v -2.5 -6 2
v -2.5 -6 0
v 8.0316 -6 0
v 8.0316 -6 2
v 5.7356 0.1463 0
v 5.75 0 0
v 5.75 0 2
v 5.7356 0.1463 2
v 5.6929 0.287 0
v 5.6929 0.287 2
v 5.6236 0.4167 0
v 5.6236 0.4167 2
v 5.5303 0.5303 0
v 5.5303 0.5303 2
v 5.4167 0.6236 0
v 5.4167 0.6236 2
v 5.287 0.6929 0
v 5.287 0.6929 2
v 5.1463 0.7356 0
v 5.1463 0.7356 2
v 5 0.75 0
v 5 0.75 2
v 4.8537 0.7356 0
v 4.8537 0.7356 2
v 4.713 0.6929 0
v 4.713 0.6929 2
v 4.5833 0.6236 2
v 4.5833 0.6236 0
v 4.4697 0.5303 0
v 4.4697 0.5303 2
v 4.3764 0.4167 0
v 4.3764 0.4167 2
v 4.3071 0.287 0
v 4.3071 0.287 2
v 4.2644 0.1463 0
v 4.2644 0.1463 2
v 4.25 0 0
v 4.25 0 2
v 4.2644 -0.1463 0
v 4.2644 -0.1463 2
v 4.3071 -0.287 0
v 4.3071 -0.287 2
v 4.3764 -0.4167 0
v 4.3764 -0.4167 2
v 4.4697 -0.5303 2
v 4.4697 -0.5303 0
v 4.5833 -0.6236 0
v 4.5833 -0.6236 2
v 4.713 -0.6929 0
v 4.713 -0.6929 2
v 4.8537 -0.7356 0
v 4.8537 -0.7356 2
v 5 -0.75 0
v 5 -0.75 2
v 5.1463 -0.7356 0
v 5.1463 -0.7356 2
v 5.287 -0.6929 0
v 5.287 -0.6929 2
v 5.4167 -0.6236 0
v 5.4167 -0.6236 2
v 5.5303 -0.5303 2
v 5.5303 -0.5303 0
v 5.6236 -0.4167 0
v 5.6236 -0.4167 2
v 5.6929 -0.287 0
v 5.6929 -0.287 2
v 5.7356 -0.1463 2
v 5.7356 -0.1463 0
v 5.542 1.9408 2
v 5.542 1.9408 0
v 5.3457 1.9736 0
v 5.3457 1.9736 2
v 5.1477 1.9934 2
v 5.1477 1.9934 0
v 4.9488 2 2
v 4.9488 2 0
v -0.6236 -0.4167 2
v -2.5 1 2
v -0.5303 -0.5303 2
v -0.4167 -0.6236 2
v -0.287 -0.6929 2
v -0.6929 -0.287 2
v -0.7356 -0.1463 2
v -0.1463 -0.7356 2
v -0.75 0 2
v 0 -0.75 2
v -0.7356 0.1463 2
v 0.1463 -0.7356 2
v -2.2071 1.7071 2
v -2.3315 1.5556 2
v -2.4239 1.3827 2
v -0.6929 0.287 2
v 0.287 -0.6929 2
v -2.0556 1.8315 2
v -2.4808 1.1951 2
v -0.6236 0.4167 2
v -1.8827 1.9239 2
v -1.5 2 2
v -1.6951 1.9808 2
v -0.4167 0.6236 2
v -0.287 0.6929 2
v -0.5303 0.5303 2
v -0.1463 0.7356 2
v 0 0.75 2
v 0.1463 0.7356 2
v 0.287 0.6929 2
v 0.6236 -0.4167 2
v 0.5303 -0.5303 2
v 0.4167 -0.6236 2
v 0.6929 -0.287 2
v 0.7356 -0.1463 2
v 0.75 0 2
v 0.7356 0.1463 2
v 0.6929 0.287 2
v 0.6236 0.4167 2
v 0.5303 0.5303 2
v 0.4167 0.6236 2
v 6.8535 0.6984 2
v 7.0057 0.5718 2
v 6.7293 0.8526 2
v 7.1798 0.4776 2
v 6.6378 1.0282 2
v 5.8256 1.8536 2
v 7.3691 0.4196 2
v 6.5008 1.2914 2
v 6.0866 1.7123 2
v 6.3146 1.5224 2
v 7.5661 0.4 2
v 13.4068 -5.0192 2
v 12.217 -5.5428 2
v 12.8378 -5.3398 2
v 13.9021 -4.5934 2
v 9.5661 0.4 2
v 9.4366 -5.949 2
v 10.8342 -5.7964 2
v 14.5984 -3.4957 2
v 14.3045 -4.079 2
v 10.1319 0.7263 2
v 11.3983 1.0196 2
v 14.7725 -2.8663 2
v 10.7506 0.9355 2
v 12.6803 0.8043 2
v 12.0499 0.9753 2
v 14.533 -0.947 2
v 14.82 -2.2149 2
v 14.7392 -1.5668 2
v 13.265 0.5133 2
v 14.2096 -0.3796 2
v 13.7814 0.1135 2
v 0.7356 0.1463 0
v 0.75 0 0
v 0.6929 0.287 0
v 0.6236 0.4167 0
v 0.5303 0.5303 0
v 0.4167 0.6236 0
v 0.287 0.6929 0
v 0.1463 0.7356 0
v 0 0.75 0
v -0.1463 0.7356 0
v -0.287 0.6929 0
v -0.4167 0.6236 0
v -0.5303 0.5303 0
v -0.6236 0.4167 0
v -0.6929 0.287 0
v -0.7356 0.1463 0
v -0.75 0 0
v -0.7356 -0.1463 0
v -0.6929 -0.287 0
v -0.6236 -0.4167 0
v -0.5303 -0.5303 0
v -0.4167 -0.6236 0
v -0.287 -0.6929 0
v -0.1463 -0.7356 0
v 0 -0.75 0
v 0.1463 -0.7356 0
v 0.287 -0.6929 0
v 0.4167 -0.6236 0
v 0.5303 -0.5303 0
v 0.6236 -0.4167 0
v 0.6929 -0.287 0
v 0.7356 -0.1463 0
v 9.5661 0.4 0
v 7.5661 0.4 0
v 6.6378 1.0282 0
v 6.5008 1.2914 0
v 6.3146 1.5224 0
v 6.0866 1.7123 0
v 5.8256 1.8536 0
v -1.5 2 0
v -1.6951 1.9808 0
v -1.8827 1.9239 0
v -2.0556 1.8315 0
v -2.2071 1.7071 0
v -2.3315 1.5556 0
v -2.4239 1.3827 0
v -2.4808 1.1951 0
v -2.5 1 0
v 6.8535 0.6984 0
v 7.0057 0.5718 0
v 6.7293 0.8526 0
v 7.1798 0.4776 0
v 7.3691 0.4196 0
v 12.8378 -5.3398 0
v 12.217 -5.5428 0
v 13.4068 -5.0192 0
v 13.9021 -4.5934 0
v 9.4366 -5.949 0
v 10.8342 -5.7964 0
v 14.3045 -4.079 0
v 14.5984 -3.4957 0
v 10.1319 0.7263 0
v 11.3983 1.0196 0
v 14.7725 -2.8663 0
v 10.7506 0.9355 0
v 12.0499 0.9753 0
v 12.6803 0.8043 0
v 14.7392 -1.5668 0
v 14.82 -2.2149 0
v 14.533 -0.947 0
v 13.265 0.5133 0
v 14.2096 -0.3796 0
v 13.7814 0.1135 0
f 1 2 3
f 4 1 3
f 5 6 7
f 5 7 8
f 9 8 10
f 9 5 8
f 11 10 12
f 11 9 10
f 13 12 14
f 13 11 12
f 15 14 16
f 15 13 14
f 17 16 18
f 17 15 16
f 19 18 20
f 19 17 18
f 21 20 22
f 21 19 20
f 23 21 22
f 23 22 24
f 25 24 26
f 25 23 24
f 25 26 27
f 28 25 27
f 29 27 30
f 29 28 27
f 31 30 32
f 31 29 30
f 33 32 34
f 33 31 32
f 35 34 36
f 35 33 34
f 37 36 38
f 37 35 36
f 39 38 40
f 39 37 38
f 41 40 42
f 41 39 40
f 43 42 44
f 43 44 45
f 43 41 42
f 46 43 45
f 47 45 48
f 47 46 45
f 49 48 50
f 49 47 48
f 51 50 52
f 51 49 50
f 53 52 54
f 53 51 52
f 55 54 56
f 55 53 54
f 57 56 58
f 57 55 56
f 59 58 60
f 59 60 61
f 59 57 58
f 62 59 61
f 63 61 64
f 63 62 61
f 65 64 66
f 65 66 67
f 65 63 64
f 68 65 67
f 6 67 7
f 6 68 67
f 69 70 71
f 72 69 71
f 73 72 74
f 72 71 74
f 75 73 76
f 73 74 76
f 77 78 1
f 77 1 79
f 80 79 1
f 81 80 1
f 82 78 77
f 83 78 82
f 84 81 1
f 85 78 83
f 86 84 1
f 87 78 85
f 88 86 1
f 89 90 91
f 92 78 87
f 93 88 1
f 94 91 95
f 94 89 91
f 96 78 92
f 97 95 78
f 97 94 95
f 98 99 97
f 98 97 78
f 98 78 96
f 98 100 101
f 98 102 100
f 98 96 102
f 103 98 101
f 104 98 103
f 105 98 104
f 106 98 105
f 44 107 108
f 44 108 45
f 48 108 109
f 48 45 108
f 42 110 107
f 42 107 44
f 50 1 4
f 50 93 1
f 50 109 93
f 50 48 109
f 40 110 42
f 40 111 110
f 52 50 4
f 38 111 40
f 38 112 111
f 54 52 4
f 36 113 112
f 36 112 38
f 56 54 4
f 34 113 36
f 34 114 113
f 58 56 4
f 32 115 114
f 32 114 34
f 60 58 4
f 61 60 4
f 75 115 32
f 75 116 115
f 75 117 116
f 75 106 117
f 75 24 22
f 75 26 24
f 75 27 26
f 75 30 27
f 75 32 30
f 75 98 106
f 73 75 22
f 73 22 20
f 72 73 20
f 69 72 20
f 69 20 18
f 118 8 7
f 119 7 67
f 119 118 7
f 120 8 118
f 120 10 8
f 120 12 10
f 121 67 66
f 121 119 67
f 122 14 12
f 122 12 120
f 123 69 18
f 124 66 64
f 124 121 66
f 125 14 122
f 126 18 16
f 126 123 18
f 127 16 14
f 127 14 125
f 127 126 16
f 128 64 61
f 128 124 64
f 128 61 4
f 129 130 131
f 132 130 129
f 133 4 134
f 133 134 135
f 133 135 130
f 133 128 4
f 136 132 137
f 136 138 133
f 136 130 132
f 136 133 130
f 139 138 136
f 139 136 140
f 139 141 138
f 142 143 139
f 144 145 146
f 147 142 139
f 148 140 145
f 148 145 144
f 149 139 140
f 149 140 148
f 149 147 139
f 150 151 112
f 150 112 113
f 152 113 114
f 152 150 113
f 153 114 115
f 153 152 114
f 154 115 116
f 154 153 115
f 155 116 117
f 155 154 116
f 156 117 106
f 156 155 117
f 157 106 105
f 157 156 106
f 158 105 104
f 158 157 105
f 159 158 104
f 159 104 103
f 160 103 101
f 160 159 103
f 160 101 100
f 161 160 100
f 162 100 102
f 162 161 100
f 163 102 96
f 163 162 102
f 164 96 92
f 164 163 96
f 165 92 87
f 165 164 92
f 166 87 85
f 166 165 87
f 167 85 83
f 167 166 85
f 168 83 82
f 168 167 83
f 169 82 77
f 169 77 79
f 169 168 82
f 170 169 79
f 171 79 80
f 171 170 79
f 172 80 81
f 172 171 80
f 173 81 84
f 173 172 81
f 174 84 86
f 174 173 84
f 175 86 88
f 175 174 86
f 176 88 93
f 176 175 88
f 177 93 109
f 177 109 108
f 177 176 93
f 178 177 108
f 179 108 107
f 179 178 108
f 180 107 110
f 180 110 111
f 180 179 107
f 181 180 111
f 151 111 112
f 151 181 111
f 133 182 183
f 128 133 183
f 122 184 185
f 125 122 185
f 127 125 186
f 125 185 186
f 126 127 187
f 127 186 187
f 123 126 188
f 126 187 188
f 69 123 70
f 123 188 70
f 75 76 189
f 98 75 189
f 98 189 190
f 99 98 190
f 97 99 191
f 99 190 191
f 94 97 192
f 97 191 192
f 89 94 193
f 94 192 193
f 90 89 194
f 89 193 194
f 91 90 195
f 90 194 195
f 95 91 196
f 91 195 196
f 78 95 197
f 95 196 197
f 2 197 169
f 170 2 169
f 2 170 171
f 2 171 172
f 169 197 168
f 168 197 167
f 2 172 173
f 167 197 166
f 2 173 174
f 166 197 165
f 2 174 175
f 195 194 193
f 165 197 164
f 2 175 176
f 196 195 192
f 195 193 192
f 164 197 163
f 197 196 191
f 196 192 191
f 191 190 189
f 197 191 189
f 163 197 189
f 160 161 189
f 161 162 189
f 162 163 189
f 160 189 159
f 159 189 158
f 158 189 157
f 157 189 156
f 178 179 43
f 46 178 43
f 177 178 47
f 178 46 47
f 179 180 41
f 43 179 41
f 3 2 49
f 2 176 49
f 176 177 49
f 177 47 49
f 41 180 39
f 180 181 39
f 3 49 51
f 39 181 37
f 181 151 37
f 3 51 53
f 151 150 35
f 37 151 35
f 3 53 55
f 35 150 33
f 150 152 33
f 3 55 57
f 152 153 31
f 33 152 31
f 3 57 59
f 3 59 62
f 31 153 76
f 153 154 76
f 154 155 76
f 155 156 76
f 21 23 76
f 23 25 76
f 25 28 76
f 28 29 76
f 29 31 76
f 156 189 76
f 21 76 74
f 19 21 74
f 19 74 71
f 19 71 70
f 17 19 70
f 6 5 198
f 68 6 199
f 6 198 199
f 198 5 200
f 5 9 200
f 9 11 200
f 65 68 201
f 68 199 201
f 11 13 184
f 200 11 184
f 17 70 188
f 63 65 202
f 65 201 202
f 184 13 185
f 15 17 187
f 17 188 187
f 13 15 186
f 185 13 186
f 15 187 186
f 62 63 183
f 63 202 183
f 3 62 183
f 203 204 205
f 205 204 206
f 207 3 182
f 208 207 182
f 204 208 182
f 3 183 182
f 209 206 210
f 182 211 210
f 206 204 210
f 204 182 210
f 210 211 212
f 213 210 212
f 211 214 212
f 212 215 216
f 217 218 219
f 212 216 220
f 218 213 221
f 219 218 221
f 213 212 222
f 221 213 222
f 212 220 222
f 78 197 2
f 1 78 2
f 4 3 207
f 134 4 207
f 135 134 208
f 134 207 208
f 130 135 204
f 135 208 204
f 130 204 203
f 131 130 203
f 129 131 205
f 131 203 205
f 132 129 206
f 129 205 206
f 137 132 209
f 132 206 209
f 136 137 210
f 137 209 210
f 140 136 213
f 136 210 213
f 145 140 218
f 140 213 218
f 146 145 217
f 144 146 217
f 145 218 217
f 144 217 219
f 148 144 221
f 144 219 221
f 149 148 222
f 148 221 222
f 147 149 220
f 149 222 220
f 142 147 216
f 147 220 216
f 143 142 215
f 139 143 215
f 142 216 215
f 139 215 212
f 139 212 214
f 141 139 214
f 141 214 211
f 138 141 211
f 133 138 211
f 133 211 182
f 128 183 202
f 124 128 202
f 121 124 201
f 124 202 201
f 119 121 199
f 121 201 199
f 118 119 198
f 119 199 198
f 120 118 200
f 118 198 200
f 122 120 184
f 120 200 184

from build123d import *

# Parameters (mm, degrees)
SKETCH1_R           = 0.75
BOSS_EXTRUDE1_DEPTH = 2


with BuildPart() as part:
    # Sketch1 → Boss-Extrude1 (new body)
    with BuildSketch(Plane.XY):
        with BuildLine():
            Line((4.948803726, 2), (-1.5, 2))
            ThreePointArc((-1.5, 2), (-2.207106781, 1.707106781), (-2.5, 1))
            Line((-2.5, 1), (-2.5, -6))
            Line((-2.5, -6), (8.03164583, -6))
            ThreePointArc((8.03164583, -6), (10.136786902, -5.885360204), (12.217030025, -5.542796686))
            ThreePointArc((12.217030025, -5.542796686), (14.533048705, -0.947048427), (9.566127614, 0.4))
            Line((9.566127614, 0.4), (7.566127614, 0.4))
            ThreePointArc((7.566127614, 0.4), (7.005701644, 0.571795477), (6.637832967, 1.028154536))
            ThreePointArc((6.637832967, 1.028154536), (6.20529876, 1.623025524), (5.541978268, 1.940772681))
            ThreePointArc((5.541978268, 1.940772681), (5.246865763, 1.985156448), (4.948803726, 2))
        make_face()
        Circle(SKETCH1_R, mode=Mode.SUBTRACT)
        with Locations((5, 0)):
            Circle(SKETCH1_R, mode=Mode.SUBTRACT)
    extrude(amount=BOSS_EXTRUDE1_DEPTH)


solid = part.part
